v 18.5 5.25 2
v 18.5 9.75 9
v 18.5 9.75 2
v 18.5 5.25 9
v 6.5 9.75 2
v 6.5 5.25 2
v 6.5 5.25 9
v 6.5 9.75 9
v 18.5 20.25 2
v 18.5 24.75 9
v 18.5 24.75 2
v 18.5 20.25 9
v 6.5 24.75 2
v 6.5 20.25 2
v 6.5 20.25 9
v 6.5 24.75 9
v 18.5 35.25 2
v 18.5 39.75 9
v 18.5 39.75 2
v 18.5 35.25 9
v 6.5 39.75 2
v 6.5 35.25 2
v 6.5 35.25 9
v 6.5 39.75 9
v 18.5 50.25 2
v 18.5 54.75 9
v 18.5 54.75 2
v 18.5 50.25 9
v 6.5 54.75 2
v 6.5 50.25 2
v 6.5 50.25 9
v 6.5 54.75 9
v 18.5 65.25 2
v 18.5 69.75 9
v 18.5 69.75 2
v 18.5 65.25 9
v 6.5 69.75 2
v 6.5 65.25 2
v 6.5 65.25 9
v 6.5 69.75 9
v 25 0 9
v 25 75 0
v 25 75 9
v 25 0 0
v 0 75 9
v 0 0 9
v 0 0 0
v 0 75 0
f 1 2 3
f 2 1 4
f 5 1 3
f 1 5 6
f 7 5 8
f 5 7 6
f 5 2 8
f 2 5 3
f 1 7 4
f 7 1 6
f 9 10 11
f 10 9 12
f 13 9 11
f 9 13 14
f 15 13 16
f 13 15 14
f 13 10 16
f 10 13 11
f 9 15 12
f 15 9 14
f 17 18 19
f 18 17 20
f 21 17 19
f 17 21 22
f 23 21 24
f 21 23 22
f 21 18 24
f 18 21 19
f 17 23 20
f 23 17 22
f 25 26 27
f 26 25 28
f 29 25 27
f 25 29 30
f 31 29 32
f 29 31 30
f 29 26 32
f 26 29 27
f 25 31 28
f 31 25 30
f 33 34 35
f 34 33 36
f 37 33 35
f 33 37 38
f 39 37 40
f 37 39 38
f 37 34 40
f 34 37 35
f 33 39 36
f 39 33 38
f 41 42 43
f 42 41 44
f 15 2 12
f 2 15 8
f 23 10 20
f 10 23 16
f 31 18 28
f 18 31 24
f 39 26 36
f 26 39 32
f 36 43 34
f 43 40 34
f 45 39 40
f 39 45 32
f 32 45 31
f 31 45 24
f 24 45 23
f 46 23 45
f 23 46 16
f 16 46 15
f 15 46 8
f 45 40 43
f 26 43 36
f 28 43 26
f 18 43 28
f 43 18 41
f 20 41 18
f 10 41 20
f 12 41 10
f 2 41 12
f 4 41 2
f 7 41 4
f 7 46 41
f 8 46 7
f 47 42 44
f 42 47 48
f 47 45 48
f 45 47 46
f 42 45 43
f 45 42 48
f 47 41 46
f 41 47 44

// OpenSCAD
// [FL_INDEX: keywords="openscad, 3d_parametric, Parametric_USB_memory_stick_holder, csg_solid" | COT="Parametric OpenSCAD design from 3DCodeverse"]
// Title: Parametric USB memory stick holder 


module deviceBlock() 
{
	cols = 1;
	rows = 5;
	
	//Center-to-center
	spacingX = 25; //USB:25
	spacingY = 15; //USB:15

	slotSizeX = 12; //USB:12
	slotSizeY = 4.5; //USB:4.5
	slotSizeZ = 7; //USB:7

	floorThickness = 2;

	blockSizeX = spacingX* (cols); 
	blockSizeY =  spacingY  * (rows);
	blockSizeZ = slotSizeZ + floorThickness;

	difference() {
		cube(size = [blockSizeX, blockSizeY, blockSizeZ]);
		for ( c = [1: cols] ) 
		{
			for ( r = [1: rows] ) 
			{
#				translate( [ spacingX * (c - 0.5) ,spacingY * (r - 0.5), blockSizeZ-(slotSizeZ/2)+.5] ) cube([slotSizeX,slotSizeY,slotSizeZ+1], center = true);
			}
		}
	}
}

deviceBlock();
